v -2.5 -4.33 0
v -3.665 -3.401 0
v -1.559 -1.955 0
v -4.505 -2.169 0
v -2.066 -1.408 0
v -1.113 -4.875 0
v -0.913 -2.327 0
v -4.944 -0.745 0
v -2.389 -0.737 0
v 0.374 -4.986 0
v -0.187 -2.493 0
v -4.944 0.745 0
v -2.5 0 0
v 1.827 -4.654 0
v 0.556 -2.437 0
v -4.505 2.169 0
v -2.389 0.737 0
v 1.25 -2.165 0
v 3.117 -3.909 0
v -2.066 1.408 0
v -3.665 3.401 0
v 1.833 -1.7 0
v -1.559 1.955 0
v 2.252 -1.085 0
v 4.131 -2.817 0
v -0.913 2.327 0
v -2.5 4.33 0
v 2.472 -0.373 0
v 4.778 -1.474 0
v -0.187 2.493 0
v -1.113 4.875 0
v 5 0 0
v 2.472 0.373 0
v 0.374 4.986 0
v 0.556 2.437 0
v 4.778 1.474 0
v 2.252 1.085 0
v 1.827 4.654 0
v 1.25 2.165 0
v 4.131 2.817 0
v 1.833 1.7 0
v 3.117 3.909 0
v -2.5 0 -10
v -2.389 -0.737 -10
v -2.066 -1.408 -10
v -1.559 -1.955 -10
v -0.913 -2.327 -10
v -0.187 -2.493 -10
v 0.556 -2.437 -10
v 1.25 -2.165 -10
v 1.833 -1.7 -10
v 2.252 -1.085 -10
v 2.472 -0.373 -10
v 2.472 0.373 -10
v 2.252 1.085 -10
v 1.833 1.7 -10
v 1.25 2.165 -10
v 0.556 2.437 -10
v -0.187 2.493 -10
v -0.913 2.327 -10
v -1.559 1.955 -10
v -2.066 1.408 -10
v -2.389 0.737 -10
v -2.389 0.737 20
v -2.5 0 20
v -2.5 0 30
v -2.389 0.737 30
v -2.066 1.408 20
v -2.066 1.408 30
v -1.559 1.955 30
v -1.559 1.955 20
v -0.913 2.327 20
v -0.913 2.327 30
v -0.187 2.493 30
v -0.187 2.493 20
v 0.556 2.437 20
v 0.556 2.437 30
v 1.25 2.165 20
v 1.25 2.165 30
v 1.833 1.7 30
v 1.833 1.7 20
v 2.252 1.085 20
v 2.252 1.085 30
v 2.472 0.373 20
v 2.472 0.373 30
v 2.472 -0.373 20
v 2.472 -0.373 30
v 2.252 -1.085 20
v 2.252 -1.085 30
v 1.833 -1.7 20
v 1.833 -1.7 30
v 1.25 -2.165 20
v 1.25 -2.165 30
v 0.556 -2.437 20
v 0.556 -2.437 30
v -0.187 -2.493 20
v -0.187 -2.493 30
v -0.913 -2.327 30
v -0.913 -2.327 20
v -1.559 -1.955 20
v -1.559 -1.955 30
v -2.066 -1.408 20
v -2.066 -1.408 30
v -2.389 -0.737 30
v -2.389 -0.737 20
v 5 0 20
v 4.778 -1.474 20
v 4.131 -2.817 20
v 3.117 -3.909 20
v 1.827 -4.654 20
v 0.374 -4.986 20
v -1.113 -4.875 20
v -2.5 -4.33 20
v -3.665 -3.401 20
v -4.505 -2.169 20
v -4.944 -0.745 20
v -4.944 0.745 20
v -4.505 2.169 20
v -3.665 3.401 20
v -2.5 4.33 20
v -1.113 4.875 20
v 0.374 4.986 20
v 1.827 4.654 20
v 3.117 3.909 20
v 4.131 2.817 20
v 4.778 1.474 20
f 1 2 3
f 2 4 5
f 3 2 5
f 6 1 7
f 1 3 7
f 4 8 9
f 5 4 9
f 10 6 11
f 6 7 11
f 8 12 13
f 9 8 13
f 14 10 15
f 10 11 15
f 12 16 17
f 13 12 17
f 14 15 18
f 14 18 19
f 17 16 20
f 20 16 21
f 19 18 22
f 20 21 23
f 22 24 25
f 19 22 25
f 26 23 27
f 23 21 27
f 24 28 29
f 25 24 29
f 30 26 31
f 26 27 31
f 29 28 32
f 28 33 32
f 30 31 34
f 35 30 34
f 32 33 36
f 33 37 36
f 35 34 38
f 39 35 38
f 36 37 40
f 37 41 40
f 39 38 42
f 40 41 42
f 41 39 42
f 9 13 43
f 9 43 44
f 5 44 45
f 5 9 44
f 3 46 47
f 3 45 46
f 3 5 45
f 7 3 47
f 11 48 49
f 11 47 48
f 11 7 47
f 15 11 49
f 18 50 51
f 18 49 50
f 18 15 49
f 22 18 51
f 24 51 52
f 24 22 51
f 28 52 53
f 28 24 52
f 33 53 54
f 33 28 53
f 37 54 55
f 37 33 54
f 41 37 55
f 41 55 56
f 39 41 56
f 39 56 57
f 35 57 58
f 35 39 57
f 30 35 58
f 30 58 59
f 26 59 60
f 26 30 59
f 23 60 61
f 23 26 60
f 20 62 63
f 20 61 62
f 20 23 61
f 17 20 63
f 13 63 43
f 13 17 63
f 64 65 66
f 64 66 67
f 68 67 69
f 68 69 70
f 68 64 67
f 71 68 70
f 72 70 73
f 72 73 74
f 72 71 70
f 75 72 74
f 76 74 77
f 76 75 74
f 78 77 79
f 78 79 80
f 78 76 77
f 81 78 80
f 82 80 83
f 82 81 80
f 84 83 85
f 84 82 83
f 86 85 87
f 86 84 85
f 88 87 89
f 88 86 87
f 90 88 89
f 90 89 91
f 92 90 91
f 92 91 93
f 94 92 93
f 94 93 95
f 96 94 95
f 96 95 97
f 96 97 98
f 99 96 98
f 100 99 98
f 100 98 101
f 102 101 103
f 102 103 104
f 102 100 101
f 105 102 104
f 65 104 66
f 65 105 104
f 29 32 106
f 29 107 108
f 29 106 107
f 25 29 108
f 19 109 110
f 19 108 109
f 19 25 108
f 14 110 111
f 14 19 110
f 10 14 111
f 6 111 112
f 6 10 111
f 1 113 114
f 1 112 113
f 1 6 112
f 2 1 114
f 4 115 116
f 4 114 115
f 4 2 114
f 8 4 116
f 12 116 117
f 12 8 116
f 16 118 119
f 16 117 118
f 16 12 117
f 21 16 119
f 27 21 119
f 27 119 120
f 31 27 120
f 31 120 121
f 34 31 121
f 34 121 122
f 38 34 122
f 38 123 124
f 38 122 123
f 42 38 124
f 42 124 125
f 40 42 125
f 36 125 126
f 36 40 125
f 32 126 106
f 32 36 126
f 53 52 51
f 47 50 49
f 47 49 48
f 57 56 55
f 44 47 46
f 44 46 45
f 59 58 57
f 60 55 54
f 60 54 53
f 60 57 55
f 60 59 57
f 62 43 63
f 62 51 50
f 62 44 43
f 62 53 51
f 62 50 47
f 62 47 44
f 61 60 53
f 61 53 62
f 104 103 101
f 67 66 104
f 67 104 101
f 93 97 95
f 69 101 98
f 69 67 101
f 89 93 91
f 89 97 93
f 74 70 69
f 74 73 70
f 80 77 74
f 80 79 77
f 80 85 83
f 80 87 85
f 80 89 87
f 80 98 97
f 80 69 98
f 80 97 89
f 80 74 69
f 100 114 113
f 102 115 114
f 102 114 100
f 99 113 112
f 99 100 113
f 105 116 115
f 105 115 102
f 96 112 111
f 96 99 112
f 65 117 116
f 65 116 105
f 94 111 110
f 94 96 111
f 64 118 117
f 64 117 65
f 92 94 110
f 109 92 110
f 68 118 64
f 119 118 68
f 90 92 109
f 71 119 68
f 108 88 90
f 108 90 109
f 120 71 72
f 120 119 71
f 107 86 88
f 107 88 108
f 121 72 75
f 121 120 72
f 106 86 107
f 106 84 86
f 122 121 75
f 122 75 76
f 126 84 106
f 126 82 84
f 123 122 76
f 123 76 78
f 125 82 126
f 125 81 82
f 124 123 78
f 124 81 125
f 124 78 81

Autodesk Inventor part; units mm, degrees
ref_plane "YZ Plane" through (0, 0, 0) normal (1, 0, 0) x (0, 1, 0)
ref_plane "XZ Plane" through (0, 0, 0) normal (0, 1, 0) x (-1, 0, 0)
sketch "Skizze1" plane through (0, 0, 0) normal (0, 0, 1) x (1, 0, 0)
  circle A0 centre (0, 0) radius 5
  dimension "d0" = 10
extrude "Extrusion1" add sketch "Skizze1" along normal blind 20
sketch "Skizze6" plane through (0, 0, 0) normal (0, 0, -1) x (-1, 0, 0)
  circle A0 centre (0, 0) radius 5 projected
  circle A1 centre (0, 0) radius 2.5
  dimension "d25" = 5
extrude "Extrusion6" add sketch "Skizze6" along normal blind 10 contours A1
ref_plane "Arbeitsebene3" through (0, 0, 10) normal (0, 0, 1) x (1, 0, 0)
mirror "Spiegeln2" about plane through (0, 0, 10) normal (0, 0, 1) of "Extrusion6"
equation "\"d0\" = Durchmesser3"
equation "\"Durchmesser1\" = 15"
equation "\"Größe1\" = 7"
equation "\"Durchmesser2\" = 3"
equation "\"Durchmesser3\" = 10"
equation "\"Größe3\" = 3"
equation "\"Größe4\" = 15"
properties part number "WellenSchiffsschraube2"
